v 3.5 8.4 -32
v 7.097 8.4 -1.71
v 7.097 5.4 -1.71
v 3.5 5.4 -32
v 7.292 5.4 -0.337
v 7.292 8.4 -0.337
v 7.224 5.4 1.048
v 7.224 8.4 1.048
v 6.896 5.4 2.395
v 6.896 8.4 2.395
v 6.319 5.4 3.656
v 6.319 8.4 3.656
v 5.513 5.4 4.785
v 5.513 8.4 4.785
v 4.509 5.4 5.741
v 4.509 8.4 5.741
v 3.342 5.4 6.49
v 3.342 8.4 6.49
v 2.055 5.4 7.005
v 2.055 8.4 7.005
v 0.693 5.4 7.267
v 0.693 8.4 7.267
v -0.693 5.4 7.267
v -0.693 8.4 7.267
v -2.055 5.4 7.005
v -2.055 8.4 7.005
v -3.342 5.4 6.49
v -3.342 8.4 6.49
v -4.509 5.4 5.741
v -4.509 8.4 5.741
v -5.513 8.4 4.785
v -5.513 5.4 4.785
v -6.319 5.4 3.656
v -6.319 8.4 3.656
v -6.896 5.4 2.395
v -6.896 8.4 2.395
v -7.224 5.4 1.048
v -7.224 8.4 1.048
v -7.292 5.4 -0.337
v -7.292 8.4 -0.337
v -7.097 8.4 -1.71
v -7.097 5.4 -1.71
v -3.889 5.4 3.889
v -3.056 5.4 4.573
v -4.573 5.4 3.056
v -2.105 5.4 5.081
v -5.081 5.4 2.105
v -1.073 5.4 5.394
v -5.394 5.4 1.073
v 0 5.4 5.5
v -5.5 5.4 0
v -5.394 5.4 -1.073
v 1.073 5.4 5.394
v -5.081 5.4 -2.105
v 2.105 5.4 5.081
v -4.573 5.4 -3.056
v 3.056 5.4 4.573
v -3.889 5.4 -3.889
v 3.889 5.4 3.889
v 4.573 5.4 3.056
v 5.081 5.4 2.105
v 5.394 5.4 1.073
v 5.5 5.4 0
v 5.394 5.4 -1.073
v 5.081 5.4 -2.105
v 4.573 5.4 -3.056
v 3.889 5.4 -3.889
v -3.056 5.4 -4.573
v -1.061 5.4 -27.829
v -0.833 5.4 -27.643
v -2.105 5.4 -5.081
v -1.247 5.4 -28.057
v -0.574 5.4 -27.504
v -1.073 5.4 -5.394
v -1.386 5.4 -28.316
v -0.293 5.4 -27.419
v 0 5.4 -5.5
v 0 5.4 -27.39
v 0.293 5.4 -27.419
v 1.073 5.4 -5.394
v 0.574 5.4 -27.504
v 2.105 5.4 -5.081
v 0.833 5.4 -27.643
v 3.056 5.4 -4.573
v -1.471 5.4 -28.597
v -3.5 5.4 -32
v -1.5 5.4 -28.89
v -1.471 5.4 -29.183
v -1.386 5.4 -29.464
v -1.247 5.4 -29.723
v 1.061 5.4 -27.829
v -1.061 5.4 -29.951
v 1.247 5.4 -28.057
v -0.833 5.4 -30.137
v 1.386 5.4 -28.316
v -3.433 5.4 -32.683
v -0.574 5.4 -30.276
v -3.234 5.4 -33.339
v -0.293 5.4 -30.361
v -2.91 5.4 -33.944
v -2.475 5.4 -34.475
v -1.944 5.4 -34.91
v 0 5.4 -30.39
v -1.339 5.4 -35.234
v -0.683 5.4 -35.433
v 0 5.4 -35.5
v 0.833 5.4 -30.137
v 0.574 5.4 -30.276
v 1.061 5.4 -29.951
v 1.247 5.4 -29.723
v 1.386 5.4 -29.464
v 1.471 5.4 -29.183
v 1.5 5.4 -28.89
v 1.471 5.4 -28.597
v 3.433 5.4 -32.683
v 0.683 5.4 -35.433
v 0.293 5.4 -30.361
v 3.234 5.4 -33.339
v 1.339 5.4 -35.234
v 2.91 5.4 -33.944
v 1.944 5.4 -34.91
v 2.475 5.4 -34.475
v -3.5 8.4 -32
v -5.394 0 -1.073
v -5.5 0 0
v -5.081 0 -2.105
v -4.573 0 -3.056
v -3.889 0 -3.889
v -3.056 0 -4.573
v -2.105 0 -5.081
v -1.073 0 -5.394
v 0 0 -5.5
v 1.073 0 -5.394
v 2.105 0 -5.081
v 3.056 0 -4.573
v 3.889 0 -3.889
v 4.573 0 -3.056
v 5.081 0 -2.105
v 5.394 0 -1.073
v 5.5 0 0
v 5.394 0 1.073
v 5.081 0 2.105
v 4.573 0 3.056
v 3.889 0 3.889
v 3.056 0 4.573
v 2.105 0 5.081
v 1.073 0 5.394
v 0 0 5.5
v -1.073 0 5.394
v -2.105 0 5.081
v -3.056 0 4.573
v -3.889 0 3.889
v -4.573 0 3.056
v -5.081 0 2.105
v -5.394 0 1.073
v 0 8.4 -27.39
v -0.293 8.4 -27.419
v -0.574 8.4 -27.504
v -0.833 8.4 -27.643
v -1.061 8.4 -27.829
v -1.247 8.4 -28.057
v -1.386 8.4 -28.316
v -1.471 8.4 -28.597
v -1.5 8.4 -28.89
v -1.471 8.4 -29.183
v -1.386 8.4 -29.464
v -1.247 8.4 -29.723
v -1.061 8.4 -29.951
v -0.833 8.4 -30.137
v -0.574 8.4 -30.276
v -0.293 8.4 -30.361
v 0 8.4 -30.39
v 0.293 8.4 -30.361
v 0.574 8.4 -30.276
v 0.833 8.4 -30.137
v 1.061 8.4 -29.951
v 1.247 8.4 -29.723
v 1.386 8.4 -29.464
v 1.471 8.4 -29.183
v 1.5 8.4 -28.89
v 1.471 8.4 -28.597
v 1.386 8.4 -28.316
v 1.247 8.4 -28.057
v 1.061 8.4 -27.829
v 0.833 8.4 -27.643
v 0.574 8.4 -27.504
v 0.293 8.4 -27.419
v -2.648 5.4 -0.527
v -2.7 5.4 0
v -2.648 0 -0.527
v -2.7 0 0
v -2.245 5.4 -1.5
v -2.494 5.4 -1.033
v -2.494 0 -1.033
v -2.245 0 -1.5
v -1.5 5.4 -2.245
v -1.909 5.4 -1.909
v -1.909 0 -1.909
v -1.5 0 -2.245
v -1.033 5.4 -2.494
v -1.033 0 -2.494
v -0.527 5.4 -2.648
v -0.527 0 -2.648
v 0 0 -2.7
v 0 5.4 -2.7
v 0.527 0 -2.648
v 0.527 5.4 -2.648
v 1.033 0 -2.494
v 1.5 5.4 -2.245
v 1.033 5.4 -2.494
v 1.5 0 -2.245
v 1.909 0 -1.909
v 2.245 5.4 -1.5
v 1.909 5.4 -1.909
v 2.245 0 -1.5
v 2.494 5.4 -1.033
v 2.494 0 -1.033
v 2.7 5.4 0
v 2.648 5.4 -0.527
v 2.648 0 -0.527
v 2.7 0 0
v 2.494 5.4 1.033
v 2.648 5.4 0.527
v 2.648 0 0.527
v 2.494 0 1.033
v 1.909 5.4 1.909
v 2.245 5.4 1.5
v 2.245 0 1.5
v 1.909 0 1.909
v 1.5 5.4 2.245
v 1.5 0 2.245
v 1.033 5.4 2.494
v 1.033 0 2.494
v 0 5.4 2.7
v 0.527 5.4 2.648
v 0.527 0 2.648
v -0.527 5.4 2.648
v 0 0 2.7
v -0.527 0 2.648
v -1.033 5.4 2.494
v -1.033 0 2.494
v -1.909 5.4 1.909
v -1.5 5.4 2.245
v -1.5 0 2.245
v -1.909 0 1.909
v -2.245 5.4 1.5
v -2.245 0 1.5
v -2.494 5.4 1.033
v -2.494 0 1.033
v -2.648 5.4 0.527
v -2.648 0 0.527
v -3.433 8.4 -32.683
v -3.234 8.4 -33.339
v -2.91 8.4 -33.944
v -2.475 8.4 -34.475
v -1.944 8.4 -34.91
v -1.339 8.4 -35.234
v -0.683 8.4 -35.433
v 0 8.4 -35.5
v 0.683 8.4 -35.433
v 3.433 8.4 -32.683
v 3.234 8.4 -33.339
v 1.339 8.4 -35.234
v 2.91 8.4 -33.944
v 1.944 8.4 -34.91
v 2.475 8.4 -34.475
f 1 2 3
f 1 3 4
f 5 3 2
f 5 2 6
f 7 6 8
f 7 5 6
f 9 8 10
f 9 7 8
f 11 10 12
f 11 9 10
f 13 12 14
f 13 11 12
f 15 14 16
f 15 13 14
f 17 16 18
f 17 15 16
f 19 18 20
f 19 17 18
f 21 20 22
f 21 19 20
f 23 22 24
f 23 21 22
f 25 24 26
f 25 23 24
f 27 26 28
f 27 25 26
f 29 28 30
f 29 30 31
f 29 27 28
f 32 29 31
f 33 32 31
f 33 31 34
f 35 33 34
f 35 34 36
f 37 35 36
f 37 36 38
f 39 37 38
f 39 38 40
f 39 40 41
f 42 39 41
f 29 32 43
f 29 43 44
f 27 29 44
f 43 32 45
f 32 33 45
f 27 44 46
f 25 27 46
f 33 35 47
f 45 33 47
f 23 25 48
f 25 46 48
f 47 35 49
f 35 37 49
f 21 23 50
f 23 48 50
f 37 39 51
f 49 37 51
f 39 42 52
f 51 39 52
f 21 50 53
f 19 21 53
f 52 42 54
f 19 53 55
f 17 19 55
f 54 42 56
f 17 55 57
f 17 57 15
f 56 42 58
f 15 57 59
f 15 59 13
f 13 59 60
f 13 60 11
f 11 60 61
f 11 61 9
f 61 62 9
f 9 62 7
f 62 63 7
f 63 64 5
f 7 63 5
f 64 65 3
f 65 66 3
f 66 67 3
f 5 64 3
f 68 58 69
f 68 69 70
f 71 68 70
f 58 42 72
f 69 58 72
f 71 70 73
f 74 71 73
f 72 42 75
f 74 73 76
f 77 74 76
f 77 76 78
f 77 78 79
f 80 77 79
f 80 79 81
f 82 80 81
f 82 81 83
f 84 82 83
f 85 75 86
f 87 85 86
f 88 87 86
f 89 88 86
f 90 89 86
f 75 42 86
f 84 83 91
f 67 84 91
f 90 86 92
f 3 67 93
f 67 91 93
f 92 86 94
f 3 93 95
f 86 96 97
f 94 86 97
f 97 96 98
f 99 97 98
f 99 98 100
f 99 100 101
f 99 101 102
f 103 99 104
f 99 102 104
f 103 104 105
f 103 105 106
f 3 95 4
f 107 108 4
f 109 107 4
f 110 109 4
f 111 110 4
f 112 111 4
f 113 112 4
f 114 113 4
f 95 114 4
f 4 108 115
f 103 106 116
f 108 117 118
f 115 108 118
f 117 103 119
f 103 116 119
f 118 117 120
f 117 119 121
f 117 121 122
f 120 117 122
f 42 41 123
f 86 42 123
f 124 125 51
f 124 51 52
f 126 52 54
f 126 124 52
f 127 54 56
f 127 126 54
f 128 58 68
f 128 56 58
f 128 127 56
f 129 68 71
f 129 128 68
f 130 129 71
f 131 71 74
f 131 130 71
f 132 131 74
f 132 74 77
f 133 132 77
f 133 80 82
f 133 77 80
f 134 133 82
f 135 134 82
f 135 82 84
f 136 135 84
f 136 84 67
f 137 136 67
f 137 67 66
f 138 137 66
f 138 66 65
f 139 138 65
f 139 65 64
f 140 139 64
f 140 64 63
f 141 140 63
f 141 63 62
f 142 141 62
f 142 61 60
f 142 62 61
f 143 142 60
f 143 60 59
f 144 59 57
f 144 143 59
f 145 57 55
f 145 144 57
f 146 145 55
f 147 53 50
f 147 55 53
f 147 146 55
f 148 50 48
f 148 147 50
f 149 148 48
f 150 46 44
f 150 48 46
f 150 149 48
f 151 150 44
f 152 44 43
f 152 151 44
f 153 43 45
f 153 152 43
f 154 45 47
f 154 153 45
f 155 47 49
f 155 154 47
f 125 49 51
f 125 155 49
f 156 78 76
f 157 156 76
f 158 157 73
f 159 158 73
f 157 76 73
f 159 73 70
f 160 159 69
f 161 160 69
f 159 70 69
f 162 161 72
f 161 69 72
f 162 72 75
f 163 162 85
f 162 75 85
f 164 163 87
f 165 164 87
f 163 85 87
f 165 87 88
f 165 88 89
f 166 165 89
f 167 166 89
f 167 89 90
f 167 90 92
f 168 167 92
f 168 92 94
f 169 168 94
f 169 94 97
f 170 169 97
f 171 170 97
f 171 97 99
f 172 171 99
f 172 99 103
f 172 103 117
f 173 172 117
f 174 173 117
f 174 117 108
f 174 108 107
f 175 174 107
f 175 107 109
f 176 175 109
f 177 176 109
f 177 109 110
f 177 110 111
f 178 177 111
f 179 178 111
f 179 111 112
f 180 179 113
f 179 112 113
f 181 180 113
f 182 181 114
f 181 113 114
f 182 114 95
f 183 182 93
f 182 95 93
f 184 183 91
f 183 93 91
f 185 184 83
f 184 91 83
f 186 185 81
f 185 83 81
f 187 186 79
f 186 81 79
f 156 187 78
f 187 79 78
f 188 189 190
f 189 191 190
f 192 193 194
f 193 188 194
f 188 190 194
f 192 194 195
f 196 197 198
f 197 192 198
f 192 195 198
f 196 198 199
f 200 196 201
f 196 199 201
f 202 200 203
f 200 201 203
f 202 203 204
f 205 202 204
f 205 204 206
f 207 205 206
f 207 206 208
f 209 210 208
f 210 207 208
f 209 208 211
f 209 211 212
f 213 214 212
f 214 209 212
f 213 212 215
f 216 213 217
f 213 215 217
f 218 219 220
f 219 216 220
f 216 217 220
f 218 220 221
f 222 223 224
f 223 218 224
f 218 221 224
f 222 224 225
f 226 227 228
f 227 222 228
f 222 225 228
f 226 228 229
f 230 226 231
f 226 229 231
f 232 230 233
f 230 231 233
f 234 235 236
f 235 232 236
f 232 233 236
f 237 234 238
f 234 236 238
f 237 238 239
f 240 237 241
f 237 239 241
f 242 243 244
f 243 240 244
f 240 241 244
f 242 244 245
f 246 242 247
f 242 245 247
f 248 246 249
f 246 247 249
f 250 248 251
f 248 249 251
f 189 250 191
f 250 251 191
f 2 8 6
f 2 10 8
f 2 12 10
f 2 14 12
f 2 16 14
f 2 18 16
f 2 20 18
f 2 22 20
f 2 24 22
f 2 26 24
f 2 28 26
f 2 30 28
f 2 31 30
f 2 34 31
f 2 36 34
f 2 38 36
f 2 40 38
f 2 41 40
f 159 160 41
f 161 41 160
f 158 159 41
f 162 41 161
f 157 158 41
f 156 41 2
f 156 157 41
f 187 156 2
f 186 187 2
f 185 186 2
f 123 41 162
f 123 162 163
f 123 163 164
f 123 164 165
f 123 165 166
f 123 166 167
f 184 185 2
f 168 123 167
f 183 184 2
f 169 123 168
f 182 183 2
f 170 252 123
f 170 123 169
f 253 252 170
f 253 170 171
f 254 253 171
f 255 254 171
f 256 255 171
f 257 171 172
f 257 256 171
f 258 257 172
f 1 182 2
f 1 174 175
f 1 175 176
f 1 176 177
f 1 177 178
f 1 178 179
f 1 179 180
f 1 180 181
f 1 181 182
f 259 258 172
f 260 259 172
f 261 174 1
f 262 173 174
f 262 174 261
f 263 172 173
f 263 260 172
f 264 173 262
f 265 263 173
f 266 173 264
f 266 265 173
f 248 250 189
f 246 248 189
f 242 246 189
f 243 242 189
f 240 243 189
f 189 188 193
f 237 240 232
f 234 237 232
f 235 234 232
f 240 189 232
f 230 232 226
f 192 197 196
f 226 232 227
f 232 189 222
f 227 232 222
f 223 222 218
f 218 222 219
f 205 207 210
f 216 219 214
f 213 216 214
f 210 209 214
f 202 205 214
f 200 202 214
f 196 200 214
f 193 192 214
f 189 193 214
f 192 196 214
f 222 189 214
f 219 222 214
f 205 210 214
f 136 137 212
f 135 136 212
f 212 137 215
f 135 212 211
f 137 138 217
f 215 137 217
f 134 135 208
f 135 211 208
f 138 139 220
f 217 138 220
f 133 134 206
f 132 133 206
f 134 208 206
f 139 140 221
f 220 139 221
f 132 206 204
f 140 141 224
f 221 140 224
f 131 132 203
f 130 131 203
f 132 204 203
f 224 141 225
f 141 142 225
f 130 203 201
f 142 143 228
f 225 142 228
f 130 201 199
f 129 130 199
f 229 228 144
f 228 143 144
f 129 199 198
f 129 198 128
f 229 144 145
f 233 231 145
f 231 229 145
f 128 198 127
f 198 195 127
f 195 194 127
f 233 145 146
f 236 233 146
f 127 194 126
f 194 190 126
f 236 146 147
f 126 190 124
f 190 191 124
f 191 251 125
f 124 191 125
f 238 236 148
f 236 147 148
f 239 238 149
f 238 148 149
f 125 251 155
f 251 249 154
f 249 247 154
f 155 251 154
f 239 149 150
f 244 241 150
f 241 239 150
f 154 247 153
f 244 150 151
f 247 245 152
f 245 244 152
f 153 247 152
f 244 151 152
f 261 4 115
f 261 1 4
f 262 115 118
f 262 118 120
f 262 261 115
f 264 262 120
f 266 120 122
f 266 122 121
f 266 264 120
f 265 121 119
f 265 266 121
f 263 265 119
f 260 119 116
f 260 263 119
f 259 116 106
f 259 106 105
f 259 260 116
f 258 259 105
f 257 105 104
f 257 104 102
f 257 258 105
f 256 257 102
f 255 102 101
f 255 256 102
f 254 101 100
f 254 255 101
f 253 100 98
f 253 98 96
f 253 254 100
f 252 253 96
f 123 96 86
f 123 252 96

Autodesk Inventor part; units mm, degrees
ref_plane "YZ Plane" through (0, 0, 0) normal (1, 0, 0) x (0, 1, 0)
ref_plane "XZ Plane" through (0, 0, 0) normal (0, 1, 0) x (-1, 0, 0)
ref_plane "XY Plane" through (0, 0, 0) normal (0, 0, 1) x (1, 0, 0)
sketch "Sketch1" plane through (0, 0, 0) normal (0, 1, 0) x (-1, 0, 0)
  circle A0 centre (0, 0) radius 2.7
  circle A1 centre (0, 0) radius 5.5
  dimension "d0" = 5.4
  dimension "d1" = 11
extrude "Extrusion1" add sketch "Sketch1" along normal blind 5.4
sketch "Sketch2" plane through (0, 5.4, 0) normal (0, 1, 0) x (1, 0, 0)
  circle A0 centre (0, 0) radius 7.3
  dimension "d4" = 14.6
extrude "Extrusion2" add sketch "Sketch2" along normal blind 3
sketch "Sketch3" plane through (0, 8.4, 0) normal (0, 1, 0) x (1, 0, 0)
  arc A0 (3.5, 32) -> (-3.5, 32) centre (0, 32) ccw
  circle A1 centre (0, 0) radius 7.3 projected
  line L0 (-7.3, 0) -> (-3.5, 32)
  line L1 (7.3, 0) -> (3.5, 32)
  dimension "d7" = 7
  dimension "d8" = 32
extrude "Extrusion3" add sketch "Sketch3" against normal blind 3 contours L1 A1 L0 A0 | L1 A1 L0
sketch "Sketch5" plane through (0, 8.4, 0) normal (0, 1, 0) x (1, 0, 0)
  point P0 (0, 0)
  point P1 (0, 28.89)
  dimension "d18" = 28.89
hole "Hole2" at (0, 8.4, -28.89) direction (0, -1, 0) diameter 3 end through all
properties part number "big_servo_arm"
